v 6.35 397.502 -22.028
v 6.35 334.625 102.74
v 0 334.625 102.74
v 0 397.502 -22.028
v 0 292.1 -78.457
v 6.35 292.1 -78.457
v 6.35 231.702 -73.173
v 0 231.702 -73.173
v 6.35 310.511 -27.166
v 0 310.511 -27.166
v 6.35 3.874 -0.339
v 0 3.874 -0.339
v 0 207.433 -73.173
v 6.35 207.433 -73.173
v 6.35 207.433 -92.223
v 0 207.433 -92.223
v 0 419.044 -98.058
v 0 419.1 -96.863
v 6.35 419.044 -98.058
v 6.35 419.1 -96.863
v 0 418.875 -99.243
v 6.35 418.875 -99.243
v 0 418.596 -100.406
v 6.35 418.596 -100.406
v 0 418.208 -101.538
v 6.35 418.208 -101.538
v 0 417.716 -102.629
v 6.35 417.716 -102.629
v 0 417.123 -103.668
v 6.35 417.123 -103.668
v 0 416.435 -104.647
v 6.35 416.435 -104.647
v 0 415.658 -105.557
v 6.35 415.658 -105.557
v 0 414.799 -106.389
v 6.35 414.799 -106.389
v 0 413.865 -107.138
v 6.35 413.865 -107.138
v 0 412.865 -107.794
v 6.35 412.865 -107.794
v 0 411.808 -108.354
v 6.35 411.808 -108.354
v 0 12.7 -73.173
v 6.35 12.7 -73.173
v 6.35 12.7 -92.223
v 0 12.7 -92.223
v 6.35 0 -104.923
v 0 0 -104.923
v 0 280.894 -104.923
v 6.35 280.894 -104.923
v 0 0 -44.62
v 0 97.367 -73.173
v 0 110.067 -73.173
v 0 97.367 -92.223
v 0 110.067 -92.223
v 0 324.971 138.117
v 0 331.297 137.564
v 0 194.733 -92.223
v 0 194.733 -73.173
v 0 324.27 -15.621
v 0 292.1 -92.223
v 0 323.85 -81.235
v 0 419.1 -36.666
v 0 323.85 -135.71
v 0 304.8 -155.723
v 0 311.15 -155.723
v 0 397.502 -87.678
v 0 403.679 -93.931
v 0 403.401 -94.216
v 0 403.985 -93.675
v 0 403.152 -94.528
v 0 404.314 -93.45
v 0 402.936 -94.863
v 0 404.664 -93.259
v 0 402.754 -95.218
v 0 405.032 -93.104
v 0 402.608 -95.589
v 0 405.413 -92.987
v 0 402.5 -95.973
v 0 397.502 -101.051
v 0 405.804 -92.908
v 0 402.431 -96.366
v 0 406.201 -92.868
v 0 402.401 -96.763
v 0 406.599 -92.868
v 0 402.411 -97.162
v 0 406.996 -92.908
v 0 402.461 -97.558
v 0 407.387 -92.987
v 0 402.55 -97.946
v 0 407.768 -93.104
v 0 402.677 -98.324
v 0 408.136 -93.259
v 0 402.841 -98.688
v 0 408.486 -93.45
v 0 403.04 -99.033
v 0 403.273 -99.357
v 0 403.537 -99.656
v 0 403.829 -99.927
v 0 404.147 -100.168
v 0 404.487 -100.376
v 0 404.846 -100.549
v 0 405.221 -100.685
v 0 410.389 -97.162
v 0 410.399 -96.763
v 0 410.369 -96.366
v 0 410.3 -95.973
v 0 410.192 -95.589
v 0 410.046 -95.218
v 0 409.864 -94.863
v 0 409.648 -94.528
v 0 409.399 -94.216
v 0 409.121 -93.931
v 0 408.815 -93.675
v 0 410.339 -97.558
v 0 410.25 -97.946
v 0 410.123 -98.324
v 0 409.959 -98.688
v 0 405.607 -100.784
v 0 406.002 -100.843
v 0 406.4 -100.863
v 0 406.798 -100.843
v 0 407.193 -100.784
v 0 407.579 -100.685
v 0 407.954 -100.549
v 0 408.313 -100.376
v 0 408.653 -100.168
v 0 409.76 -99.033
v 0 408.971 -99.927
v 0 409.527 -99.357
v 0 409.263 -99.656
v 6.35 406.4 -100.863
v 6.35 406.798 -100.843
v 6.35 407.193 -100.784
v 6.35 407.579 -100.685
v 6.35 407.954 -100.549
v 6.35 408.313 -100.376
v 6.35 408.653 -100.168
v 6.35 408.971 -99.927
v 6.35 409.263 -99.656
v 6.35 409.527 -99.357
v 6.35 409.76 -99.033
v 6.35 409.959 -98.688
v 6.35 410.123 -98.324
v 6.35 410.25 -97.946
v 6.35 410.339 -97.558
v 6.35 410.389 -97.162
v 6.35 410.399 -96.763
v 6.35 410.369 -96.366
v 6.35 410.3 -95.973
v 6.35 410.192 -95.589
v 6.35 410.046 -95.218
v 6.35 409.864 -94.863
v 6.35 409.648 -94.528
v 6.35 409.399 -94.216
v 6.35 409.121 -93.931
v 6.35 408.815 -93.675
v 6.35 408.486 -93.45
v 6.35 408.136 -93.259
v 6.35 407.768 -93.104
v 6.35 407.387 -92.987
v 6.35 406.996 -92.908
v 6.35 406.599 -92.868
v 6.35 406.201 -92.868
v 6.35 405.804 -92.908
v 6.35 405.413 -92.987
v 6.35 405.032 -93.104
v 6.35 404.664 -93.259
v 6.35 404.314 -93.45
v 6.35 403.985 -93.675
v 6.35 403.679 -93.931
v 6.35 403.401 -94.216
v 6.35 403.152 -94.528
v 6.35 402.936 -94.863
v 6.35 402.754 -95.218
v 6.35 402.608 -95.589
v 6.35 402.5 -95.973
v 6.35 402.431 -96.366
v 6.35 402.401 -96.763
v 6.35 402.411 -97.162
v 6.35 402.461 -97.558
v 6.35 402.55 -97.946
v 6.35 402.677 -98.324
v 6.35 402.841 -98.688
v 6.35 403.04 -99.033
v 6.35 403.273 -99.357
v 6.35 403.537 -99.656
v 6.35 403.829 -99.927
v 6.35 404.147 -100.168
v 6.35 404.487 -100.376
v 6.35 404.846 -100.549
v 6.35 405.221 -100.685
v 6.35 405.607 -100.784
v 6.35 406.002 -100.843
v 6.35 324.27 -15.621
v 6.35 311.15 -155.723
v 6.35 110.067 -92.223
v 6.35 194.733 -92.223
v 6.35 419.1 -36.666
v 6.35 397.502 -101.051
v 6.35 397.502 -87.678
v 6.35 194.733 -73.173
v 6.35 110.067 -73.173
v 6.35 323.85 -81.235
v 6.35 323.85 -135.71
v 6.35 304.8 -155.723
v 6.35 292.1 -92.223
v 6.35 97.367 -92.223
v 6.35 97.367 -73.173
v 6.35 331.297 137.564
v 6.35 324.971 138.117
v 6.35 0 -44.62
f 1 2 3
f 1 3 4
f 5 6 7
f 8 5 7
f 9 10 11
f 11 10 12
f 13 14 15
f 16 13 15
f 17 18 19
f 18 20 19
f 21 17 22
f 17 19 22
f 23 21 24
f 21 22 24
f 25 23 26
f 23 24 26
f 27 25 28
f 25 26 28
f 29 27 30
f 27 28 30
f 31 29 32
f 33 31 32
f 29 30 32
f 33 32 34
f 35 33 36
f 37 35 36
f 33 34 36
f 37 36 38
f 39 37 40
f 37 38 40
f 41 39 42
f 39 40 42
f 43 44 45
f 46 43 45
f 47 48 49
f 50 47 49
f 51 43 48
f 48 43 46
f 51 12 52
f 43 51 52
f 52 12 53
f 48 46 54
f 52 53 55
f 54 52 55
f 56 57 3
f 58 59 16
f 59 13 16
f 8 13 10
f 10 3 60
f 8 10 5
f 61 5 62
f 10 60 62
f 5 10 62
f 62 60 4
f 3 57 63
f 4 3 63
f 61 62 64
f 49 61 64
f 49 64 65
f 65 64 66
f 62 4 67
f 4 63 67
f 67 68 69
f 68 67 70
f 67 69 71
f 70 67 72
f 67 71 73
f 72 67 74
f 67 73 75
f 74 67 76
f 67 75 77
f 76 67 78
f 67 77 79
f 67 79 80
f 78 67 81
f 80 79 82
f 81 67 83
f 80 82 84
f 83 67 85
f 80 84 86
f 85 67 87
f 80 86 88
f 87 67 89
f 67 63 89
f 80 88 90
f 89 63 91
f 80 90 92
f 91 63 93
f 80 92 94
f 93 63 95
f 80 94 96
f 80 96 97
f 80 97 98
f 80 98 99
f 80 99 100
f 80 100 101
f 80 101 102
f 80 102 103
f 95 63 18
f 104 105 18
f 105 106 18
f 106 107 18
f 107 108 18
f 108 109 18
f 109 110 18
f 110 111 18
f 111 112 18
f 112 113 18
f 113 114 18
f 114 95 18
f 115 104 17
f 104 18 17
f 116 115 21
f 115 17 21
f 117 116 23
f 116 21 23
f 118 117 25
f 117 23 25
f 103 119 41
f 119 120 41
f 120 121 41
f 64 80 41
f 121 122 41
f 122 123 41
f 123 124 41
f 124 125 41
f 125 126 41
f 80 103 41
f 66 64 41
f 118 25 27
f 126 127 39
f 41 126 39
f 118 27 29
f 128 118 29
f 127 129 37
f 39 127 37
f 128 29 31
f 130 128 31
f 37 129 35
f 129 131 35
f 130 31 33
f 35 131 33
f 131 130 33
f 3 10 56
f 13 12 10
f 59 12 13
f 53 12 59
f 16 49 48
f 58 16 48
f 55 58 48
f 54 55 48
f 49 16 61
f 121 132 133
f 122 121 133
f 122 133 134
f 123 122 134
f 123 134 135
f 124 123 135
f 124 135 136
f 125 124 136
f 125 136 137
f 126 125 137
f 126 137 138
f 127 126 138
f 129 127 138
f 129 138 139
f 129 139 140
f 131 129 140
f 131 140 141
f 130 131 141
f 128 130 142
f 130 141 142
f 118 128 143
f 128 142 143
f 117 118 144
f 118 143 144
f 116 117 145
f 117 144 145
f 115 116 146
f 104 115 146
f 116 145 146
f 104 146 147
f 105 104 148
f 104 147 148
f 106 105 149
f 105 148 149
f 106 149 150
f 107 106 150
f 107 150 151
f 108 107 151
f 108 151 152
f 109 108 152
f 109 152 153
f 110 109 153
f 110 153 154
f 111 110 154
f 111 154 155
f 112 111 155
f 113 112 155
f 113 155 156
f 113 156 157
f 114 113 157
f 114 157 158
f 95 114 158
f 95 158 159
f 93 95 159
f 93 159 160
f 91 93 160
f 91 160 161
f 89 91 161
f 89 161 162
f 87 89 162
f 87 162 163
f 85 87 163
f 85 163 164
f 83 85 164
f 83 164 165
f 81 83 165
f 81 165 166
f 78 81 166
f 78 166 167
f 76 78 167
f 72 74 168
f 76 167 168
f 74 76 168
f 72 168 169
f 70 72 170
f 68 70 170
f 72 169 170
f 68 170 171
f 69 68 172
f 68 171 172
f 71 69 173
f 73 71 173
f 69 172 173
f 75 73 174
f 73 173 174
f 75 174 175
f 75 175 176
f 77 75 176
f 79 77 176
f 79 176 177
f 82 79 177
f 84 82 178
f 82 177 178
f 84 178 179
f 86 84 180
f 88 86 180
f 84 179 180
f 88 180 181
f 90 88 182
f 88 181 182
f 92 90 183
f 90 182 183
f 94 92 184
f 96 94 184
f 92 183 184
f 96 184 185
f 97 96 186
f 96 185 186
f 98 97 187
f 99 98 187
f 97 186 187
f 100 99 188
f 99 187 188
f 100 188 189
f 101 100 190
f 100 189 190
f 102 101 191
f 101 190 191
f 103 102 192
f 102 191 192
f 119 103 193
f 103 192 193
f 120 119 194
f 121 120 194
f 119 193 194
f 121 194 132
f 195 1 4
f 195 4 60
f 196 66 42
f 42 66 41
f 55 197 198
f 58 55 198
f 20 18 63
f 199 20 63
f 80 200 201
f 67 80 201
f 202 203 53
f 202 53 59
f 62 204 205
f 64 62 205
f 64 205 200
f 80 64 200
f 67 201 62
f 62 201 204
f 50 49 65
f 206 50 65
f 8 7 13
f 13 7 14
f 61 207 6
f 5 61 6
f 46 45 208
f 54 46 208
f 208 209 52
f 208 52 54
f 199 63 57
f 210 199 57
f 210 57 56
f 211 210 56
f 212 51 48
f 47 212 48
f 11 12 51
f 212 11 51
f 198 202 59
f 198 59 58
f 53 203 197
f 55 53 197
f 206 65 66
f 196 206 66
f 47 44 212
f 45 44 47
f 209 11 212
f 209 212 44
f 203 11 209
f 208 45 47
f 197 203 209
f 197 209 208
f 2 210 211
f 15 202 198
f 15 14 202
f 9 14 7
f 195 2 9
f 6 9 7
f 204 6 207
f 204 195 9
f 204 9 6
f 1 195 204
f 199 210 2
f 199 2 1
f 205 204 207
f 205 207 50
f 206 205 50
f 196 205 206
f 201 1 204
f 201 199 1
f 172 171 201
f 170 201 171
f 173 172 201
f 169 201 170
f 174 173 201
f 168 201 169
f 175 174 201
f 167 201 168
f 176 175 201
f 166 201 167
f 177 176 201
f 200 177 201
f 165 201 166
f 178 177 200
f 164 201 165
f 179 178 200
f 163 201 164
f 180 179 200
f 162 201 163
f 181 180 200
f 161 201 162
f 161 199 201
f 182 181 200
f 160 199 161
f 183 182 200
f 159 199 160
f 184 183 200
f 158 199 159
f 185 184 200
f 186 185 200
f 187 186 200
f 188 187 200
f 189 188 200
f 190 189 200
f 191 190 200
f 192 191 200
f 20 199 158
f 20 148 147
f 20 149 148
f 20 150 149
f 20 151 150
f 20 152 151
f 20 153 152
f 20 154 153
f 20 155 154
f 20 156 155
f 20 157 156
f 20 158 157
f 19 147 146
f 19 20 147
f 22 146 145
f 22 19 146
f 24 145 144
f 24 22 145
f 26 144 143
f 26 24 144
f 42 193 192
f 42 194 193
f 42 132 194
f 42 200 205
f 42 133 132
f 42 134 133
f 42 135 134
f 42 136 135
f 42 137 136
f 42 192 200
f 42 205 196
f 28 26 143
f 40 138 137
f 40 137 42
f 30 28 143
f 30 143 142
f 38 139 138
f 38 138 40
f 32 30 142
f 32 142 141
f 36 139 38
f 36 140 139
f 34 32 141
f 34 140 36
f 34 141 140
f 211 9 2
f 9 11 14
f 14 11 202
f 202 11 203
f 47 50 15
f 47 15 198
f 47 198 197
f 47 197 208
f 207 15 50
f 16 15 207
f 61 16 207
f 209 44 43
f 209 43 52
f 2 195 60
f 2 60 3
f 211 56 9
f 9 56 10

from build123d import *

# Parameters (mm, degrees)
BOSS_EXTRUDE1_DEPTH = 6.35
SKETCH2_W           = 19.05
SKETCH2_H           = 84.666666666
SKETCH2_H_2         = 84.666666667
CUT_EXTRUDE4_DEPTH  = 7.35
FILLET1_R           = 12.7
SKETCH3_R           = 4
CUT_EXTRUDE5_DEPTH  = 7.35


with BuildPart() as part:
    # Sketch1 → Boss-Extrude1 (new body)
    with BuildSketch(Plane(origin=(0, 0, 0), x_dir=(0, 0, -1), z_dir=(1, 0, 0))):
        Polygon((-138.117194795, 324.971426047), (27.166192695, 310.511003372), (0.338937449, 3.874072765), (44.619791779, 0), (104.922607749, 0), (104.922607749, 280.894117647), (155.722607749, 304.8), (155.722607749, 311.15), (104.922607749, 419.1), (36.666498884, 419.1), (-137.563755829, 331.29726238), align=None)
    extrude(amount=BOSS_EXTRUDE1_DEPTH)

    # Sketch2 → Cut-Extrude4 (cut, through all)
    with BuildSketch(Plane(origin=(6.35, 0, 0), x_dir=(0, 0, -1), z_dir=(1, 0, 0))):
        Polygon((-102.740376399, 334.624867423), (22.028376277, 397.501651207), (15.621397962, 324.269553971), align=None)
        Polygon((87.678193652, 397.501651207), (81.234509121, 323.85), (135.710176178, 323.85), (101.05057561, 397.501651207), align=None)
        Polygon((78.456744054, 292.1), (73.172607749, 231.702045651), (73.172607749, 207.433333333), (92.222607749, 207.433333333), (92.222607749, 292.1), align=None)
        with Locations((82.697607749, 152.4)):
            Rectangle(SKETCH2_W, SKETCH2_H)
        with Locations((82.697607749, 55.033333334)):
            Rectangle(SKETCH2_W, SKETCH2_H_2)
    extrude(amount=-CUT_EXTRUDE4_DEPTH, mode=Mode.SUBTRACT)

    # Fillet1
    fillet1_edges = [part.edges().sort_by_distance(p)[0] for p in [
        (3.175, 419.1, -104.922607749),
    ]]
    fillet(fillet1_edges, radius=FILLET1_R)

    # Sketch3 → Cut-Extrude5 (cut, through all)
    with BuildSketch(Plane(origin=(6.35, 0, 0), x_dir=(0, 0, -1), z_dir=(1, 0, 0))):
        with Locations((96.863117355, 406.4)):
            Circle(SKETCH3_R)
    extrude(amount=-CUT_EXTRUDE5_DEPTH, mode=Mode.SUBTRACT)


solid = part.part
